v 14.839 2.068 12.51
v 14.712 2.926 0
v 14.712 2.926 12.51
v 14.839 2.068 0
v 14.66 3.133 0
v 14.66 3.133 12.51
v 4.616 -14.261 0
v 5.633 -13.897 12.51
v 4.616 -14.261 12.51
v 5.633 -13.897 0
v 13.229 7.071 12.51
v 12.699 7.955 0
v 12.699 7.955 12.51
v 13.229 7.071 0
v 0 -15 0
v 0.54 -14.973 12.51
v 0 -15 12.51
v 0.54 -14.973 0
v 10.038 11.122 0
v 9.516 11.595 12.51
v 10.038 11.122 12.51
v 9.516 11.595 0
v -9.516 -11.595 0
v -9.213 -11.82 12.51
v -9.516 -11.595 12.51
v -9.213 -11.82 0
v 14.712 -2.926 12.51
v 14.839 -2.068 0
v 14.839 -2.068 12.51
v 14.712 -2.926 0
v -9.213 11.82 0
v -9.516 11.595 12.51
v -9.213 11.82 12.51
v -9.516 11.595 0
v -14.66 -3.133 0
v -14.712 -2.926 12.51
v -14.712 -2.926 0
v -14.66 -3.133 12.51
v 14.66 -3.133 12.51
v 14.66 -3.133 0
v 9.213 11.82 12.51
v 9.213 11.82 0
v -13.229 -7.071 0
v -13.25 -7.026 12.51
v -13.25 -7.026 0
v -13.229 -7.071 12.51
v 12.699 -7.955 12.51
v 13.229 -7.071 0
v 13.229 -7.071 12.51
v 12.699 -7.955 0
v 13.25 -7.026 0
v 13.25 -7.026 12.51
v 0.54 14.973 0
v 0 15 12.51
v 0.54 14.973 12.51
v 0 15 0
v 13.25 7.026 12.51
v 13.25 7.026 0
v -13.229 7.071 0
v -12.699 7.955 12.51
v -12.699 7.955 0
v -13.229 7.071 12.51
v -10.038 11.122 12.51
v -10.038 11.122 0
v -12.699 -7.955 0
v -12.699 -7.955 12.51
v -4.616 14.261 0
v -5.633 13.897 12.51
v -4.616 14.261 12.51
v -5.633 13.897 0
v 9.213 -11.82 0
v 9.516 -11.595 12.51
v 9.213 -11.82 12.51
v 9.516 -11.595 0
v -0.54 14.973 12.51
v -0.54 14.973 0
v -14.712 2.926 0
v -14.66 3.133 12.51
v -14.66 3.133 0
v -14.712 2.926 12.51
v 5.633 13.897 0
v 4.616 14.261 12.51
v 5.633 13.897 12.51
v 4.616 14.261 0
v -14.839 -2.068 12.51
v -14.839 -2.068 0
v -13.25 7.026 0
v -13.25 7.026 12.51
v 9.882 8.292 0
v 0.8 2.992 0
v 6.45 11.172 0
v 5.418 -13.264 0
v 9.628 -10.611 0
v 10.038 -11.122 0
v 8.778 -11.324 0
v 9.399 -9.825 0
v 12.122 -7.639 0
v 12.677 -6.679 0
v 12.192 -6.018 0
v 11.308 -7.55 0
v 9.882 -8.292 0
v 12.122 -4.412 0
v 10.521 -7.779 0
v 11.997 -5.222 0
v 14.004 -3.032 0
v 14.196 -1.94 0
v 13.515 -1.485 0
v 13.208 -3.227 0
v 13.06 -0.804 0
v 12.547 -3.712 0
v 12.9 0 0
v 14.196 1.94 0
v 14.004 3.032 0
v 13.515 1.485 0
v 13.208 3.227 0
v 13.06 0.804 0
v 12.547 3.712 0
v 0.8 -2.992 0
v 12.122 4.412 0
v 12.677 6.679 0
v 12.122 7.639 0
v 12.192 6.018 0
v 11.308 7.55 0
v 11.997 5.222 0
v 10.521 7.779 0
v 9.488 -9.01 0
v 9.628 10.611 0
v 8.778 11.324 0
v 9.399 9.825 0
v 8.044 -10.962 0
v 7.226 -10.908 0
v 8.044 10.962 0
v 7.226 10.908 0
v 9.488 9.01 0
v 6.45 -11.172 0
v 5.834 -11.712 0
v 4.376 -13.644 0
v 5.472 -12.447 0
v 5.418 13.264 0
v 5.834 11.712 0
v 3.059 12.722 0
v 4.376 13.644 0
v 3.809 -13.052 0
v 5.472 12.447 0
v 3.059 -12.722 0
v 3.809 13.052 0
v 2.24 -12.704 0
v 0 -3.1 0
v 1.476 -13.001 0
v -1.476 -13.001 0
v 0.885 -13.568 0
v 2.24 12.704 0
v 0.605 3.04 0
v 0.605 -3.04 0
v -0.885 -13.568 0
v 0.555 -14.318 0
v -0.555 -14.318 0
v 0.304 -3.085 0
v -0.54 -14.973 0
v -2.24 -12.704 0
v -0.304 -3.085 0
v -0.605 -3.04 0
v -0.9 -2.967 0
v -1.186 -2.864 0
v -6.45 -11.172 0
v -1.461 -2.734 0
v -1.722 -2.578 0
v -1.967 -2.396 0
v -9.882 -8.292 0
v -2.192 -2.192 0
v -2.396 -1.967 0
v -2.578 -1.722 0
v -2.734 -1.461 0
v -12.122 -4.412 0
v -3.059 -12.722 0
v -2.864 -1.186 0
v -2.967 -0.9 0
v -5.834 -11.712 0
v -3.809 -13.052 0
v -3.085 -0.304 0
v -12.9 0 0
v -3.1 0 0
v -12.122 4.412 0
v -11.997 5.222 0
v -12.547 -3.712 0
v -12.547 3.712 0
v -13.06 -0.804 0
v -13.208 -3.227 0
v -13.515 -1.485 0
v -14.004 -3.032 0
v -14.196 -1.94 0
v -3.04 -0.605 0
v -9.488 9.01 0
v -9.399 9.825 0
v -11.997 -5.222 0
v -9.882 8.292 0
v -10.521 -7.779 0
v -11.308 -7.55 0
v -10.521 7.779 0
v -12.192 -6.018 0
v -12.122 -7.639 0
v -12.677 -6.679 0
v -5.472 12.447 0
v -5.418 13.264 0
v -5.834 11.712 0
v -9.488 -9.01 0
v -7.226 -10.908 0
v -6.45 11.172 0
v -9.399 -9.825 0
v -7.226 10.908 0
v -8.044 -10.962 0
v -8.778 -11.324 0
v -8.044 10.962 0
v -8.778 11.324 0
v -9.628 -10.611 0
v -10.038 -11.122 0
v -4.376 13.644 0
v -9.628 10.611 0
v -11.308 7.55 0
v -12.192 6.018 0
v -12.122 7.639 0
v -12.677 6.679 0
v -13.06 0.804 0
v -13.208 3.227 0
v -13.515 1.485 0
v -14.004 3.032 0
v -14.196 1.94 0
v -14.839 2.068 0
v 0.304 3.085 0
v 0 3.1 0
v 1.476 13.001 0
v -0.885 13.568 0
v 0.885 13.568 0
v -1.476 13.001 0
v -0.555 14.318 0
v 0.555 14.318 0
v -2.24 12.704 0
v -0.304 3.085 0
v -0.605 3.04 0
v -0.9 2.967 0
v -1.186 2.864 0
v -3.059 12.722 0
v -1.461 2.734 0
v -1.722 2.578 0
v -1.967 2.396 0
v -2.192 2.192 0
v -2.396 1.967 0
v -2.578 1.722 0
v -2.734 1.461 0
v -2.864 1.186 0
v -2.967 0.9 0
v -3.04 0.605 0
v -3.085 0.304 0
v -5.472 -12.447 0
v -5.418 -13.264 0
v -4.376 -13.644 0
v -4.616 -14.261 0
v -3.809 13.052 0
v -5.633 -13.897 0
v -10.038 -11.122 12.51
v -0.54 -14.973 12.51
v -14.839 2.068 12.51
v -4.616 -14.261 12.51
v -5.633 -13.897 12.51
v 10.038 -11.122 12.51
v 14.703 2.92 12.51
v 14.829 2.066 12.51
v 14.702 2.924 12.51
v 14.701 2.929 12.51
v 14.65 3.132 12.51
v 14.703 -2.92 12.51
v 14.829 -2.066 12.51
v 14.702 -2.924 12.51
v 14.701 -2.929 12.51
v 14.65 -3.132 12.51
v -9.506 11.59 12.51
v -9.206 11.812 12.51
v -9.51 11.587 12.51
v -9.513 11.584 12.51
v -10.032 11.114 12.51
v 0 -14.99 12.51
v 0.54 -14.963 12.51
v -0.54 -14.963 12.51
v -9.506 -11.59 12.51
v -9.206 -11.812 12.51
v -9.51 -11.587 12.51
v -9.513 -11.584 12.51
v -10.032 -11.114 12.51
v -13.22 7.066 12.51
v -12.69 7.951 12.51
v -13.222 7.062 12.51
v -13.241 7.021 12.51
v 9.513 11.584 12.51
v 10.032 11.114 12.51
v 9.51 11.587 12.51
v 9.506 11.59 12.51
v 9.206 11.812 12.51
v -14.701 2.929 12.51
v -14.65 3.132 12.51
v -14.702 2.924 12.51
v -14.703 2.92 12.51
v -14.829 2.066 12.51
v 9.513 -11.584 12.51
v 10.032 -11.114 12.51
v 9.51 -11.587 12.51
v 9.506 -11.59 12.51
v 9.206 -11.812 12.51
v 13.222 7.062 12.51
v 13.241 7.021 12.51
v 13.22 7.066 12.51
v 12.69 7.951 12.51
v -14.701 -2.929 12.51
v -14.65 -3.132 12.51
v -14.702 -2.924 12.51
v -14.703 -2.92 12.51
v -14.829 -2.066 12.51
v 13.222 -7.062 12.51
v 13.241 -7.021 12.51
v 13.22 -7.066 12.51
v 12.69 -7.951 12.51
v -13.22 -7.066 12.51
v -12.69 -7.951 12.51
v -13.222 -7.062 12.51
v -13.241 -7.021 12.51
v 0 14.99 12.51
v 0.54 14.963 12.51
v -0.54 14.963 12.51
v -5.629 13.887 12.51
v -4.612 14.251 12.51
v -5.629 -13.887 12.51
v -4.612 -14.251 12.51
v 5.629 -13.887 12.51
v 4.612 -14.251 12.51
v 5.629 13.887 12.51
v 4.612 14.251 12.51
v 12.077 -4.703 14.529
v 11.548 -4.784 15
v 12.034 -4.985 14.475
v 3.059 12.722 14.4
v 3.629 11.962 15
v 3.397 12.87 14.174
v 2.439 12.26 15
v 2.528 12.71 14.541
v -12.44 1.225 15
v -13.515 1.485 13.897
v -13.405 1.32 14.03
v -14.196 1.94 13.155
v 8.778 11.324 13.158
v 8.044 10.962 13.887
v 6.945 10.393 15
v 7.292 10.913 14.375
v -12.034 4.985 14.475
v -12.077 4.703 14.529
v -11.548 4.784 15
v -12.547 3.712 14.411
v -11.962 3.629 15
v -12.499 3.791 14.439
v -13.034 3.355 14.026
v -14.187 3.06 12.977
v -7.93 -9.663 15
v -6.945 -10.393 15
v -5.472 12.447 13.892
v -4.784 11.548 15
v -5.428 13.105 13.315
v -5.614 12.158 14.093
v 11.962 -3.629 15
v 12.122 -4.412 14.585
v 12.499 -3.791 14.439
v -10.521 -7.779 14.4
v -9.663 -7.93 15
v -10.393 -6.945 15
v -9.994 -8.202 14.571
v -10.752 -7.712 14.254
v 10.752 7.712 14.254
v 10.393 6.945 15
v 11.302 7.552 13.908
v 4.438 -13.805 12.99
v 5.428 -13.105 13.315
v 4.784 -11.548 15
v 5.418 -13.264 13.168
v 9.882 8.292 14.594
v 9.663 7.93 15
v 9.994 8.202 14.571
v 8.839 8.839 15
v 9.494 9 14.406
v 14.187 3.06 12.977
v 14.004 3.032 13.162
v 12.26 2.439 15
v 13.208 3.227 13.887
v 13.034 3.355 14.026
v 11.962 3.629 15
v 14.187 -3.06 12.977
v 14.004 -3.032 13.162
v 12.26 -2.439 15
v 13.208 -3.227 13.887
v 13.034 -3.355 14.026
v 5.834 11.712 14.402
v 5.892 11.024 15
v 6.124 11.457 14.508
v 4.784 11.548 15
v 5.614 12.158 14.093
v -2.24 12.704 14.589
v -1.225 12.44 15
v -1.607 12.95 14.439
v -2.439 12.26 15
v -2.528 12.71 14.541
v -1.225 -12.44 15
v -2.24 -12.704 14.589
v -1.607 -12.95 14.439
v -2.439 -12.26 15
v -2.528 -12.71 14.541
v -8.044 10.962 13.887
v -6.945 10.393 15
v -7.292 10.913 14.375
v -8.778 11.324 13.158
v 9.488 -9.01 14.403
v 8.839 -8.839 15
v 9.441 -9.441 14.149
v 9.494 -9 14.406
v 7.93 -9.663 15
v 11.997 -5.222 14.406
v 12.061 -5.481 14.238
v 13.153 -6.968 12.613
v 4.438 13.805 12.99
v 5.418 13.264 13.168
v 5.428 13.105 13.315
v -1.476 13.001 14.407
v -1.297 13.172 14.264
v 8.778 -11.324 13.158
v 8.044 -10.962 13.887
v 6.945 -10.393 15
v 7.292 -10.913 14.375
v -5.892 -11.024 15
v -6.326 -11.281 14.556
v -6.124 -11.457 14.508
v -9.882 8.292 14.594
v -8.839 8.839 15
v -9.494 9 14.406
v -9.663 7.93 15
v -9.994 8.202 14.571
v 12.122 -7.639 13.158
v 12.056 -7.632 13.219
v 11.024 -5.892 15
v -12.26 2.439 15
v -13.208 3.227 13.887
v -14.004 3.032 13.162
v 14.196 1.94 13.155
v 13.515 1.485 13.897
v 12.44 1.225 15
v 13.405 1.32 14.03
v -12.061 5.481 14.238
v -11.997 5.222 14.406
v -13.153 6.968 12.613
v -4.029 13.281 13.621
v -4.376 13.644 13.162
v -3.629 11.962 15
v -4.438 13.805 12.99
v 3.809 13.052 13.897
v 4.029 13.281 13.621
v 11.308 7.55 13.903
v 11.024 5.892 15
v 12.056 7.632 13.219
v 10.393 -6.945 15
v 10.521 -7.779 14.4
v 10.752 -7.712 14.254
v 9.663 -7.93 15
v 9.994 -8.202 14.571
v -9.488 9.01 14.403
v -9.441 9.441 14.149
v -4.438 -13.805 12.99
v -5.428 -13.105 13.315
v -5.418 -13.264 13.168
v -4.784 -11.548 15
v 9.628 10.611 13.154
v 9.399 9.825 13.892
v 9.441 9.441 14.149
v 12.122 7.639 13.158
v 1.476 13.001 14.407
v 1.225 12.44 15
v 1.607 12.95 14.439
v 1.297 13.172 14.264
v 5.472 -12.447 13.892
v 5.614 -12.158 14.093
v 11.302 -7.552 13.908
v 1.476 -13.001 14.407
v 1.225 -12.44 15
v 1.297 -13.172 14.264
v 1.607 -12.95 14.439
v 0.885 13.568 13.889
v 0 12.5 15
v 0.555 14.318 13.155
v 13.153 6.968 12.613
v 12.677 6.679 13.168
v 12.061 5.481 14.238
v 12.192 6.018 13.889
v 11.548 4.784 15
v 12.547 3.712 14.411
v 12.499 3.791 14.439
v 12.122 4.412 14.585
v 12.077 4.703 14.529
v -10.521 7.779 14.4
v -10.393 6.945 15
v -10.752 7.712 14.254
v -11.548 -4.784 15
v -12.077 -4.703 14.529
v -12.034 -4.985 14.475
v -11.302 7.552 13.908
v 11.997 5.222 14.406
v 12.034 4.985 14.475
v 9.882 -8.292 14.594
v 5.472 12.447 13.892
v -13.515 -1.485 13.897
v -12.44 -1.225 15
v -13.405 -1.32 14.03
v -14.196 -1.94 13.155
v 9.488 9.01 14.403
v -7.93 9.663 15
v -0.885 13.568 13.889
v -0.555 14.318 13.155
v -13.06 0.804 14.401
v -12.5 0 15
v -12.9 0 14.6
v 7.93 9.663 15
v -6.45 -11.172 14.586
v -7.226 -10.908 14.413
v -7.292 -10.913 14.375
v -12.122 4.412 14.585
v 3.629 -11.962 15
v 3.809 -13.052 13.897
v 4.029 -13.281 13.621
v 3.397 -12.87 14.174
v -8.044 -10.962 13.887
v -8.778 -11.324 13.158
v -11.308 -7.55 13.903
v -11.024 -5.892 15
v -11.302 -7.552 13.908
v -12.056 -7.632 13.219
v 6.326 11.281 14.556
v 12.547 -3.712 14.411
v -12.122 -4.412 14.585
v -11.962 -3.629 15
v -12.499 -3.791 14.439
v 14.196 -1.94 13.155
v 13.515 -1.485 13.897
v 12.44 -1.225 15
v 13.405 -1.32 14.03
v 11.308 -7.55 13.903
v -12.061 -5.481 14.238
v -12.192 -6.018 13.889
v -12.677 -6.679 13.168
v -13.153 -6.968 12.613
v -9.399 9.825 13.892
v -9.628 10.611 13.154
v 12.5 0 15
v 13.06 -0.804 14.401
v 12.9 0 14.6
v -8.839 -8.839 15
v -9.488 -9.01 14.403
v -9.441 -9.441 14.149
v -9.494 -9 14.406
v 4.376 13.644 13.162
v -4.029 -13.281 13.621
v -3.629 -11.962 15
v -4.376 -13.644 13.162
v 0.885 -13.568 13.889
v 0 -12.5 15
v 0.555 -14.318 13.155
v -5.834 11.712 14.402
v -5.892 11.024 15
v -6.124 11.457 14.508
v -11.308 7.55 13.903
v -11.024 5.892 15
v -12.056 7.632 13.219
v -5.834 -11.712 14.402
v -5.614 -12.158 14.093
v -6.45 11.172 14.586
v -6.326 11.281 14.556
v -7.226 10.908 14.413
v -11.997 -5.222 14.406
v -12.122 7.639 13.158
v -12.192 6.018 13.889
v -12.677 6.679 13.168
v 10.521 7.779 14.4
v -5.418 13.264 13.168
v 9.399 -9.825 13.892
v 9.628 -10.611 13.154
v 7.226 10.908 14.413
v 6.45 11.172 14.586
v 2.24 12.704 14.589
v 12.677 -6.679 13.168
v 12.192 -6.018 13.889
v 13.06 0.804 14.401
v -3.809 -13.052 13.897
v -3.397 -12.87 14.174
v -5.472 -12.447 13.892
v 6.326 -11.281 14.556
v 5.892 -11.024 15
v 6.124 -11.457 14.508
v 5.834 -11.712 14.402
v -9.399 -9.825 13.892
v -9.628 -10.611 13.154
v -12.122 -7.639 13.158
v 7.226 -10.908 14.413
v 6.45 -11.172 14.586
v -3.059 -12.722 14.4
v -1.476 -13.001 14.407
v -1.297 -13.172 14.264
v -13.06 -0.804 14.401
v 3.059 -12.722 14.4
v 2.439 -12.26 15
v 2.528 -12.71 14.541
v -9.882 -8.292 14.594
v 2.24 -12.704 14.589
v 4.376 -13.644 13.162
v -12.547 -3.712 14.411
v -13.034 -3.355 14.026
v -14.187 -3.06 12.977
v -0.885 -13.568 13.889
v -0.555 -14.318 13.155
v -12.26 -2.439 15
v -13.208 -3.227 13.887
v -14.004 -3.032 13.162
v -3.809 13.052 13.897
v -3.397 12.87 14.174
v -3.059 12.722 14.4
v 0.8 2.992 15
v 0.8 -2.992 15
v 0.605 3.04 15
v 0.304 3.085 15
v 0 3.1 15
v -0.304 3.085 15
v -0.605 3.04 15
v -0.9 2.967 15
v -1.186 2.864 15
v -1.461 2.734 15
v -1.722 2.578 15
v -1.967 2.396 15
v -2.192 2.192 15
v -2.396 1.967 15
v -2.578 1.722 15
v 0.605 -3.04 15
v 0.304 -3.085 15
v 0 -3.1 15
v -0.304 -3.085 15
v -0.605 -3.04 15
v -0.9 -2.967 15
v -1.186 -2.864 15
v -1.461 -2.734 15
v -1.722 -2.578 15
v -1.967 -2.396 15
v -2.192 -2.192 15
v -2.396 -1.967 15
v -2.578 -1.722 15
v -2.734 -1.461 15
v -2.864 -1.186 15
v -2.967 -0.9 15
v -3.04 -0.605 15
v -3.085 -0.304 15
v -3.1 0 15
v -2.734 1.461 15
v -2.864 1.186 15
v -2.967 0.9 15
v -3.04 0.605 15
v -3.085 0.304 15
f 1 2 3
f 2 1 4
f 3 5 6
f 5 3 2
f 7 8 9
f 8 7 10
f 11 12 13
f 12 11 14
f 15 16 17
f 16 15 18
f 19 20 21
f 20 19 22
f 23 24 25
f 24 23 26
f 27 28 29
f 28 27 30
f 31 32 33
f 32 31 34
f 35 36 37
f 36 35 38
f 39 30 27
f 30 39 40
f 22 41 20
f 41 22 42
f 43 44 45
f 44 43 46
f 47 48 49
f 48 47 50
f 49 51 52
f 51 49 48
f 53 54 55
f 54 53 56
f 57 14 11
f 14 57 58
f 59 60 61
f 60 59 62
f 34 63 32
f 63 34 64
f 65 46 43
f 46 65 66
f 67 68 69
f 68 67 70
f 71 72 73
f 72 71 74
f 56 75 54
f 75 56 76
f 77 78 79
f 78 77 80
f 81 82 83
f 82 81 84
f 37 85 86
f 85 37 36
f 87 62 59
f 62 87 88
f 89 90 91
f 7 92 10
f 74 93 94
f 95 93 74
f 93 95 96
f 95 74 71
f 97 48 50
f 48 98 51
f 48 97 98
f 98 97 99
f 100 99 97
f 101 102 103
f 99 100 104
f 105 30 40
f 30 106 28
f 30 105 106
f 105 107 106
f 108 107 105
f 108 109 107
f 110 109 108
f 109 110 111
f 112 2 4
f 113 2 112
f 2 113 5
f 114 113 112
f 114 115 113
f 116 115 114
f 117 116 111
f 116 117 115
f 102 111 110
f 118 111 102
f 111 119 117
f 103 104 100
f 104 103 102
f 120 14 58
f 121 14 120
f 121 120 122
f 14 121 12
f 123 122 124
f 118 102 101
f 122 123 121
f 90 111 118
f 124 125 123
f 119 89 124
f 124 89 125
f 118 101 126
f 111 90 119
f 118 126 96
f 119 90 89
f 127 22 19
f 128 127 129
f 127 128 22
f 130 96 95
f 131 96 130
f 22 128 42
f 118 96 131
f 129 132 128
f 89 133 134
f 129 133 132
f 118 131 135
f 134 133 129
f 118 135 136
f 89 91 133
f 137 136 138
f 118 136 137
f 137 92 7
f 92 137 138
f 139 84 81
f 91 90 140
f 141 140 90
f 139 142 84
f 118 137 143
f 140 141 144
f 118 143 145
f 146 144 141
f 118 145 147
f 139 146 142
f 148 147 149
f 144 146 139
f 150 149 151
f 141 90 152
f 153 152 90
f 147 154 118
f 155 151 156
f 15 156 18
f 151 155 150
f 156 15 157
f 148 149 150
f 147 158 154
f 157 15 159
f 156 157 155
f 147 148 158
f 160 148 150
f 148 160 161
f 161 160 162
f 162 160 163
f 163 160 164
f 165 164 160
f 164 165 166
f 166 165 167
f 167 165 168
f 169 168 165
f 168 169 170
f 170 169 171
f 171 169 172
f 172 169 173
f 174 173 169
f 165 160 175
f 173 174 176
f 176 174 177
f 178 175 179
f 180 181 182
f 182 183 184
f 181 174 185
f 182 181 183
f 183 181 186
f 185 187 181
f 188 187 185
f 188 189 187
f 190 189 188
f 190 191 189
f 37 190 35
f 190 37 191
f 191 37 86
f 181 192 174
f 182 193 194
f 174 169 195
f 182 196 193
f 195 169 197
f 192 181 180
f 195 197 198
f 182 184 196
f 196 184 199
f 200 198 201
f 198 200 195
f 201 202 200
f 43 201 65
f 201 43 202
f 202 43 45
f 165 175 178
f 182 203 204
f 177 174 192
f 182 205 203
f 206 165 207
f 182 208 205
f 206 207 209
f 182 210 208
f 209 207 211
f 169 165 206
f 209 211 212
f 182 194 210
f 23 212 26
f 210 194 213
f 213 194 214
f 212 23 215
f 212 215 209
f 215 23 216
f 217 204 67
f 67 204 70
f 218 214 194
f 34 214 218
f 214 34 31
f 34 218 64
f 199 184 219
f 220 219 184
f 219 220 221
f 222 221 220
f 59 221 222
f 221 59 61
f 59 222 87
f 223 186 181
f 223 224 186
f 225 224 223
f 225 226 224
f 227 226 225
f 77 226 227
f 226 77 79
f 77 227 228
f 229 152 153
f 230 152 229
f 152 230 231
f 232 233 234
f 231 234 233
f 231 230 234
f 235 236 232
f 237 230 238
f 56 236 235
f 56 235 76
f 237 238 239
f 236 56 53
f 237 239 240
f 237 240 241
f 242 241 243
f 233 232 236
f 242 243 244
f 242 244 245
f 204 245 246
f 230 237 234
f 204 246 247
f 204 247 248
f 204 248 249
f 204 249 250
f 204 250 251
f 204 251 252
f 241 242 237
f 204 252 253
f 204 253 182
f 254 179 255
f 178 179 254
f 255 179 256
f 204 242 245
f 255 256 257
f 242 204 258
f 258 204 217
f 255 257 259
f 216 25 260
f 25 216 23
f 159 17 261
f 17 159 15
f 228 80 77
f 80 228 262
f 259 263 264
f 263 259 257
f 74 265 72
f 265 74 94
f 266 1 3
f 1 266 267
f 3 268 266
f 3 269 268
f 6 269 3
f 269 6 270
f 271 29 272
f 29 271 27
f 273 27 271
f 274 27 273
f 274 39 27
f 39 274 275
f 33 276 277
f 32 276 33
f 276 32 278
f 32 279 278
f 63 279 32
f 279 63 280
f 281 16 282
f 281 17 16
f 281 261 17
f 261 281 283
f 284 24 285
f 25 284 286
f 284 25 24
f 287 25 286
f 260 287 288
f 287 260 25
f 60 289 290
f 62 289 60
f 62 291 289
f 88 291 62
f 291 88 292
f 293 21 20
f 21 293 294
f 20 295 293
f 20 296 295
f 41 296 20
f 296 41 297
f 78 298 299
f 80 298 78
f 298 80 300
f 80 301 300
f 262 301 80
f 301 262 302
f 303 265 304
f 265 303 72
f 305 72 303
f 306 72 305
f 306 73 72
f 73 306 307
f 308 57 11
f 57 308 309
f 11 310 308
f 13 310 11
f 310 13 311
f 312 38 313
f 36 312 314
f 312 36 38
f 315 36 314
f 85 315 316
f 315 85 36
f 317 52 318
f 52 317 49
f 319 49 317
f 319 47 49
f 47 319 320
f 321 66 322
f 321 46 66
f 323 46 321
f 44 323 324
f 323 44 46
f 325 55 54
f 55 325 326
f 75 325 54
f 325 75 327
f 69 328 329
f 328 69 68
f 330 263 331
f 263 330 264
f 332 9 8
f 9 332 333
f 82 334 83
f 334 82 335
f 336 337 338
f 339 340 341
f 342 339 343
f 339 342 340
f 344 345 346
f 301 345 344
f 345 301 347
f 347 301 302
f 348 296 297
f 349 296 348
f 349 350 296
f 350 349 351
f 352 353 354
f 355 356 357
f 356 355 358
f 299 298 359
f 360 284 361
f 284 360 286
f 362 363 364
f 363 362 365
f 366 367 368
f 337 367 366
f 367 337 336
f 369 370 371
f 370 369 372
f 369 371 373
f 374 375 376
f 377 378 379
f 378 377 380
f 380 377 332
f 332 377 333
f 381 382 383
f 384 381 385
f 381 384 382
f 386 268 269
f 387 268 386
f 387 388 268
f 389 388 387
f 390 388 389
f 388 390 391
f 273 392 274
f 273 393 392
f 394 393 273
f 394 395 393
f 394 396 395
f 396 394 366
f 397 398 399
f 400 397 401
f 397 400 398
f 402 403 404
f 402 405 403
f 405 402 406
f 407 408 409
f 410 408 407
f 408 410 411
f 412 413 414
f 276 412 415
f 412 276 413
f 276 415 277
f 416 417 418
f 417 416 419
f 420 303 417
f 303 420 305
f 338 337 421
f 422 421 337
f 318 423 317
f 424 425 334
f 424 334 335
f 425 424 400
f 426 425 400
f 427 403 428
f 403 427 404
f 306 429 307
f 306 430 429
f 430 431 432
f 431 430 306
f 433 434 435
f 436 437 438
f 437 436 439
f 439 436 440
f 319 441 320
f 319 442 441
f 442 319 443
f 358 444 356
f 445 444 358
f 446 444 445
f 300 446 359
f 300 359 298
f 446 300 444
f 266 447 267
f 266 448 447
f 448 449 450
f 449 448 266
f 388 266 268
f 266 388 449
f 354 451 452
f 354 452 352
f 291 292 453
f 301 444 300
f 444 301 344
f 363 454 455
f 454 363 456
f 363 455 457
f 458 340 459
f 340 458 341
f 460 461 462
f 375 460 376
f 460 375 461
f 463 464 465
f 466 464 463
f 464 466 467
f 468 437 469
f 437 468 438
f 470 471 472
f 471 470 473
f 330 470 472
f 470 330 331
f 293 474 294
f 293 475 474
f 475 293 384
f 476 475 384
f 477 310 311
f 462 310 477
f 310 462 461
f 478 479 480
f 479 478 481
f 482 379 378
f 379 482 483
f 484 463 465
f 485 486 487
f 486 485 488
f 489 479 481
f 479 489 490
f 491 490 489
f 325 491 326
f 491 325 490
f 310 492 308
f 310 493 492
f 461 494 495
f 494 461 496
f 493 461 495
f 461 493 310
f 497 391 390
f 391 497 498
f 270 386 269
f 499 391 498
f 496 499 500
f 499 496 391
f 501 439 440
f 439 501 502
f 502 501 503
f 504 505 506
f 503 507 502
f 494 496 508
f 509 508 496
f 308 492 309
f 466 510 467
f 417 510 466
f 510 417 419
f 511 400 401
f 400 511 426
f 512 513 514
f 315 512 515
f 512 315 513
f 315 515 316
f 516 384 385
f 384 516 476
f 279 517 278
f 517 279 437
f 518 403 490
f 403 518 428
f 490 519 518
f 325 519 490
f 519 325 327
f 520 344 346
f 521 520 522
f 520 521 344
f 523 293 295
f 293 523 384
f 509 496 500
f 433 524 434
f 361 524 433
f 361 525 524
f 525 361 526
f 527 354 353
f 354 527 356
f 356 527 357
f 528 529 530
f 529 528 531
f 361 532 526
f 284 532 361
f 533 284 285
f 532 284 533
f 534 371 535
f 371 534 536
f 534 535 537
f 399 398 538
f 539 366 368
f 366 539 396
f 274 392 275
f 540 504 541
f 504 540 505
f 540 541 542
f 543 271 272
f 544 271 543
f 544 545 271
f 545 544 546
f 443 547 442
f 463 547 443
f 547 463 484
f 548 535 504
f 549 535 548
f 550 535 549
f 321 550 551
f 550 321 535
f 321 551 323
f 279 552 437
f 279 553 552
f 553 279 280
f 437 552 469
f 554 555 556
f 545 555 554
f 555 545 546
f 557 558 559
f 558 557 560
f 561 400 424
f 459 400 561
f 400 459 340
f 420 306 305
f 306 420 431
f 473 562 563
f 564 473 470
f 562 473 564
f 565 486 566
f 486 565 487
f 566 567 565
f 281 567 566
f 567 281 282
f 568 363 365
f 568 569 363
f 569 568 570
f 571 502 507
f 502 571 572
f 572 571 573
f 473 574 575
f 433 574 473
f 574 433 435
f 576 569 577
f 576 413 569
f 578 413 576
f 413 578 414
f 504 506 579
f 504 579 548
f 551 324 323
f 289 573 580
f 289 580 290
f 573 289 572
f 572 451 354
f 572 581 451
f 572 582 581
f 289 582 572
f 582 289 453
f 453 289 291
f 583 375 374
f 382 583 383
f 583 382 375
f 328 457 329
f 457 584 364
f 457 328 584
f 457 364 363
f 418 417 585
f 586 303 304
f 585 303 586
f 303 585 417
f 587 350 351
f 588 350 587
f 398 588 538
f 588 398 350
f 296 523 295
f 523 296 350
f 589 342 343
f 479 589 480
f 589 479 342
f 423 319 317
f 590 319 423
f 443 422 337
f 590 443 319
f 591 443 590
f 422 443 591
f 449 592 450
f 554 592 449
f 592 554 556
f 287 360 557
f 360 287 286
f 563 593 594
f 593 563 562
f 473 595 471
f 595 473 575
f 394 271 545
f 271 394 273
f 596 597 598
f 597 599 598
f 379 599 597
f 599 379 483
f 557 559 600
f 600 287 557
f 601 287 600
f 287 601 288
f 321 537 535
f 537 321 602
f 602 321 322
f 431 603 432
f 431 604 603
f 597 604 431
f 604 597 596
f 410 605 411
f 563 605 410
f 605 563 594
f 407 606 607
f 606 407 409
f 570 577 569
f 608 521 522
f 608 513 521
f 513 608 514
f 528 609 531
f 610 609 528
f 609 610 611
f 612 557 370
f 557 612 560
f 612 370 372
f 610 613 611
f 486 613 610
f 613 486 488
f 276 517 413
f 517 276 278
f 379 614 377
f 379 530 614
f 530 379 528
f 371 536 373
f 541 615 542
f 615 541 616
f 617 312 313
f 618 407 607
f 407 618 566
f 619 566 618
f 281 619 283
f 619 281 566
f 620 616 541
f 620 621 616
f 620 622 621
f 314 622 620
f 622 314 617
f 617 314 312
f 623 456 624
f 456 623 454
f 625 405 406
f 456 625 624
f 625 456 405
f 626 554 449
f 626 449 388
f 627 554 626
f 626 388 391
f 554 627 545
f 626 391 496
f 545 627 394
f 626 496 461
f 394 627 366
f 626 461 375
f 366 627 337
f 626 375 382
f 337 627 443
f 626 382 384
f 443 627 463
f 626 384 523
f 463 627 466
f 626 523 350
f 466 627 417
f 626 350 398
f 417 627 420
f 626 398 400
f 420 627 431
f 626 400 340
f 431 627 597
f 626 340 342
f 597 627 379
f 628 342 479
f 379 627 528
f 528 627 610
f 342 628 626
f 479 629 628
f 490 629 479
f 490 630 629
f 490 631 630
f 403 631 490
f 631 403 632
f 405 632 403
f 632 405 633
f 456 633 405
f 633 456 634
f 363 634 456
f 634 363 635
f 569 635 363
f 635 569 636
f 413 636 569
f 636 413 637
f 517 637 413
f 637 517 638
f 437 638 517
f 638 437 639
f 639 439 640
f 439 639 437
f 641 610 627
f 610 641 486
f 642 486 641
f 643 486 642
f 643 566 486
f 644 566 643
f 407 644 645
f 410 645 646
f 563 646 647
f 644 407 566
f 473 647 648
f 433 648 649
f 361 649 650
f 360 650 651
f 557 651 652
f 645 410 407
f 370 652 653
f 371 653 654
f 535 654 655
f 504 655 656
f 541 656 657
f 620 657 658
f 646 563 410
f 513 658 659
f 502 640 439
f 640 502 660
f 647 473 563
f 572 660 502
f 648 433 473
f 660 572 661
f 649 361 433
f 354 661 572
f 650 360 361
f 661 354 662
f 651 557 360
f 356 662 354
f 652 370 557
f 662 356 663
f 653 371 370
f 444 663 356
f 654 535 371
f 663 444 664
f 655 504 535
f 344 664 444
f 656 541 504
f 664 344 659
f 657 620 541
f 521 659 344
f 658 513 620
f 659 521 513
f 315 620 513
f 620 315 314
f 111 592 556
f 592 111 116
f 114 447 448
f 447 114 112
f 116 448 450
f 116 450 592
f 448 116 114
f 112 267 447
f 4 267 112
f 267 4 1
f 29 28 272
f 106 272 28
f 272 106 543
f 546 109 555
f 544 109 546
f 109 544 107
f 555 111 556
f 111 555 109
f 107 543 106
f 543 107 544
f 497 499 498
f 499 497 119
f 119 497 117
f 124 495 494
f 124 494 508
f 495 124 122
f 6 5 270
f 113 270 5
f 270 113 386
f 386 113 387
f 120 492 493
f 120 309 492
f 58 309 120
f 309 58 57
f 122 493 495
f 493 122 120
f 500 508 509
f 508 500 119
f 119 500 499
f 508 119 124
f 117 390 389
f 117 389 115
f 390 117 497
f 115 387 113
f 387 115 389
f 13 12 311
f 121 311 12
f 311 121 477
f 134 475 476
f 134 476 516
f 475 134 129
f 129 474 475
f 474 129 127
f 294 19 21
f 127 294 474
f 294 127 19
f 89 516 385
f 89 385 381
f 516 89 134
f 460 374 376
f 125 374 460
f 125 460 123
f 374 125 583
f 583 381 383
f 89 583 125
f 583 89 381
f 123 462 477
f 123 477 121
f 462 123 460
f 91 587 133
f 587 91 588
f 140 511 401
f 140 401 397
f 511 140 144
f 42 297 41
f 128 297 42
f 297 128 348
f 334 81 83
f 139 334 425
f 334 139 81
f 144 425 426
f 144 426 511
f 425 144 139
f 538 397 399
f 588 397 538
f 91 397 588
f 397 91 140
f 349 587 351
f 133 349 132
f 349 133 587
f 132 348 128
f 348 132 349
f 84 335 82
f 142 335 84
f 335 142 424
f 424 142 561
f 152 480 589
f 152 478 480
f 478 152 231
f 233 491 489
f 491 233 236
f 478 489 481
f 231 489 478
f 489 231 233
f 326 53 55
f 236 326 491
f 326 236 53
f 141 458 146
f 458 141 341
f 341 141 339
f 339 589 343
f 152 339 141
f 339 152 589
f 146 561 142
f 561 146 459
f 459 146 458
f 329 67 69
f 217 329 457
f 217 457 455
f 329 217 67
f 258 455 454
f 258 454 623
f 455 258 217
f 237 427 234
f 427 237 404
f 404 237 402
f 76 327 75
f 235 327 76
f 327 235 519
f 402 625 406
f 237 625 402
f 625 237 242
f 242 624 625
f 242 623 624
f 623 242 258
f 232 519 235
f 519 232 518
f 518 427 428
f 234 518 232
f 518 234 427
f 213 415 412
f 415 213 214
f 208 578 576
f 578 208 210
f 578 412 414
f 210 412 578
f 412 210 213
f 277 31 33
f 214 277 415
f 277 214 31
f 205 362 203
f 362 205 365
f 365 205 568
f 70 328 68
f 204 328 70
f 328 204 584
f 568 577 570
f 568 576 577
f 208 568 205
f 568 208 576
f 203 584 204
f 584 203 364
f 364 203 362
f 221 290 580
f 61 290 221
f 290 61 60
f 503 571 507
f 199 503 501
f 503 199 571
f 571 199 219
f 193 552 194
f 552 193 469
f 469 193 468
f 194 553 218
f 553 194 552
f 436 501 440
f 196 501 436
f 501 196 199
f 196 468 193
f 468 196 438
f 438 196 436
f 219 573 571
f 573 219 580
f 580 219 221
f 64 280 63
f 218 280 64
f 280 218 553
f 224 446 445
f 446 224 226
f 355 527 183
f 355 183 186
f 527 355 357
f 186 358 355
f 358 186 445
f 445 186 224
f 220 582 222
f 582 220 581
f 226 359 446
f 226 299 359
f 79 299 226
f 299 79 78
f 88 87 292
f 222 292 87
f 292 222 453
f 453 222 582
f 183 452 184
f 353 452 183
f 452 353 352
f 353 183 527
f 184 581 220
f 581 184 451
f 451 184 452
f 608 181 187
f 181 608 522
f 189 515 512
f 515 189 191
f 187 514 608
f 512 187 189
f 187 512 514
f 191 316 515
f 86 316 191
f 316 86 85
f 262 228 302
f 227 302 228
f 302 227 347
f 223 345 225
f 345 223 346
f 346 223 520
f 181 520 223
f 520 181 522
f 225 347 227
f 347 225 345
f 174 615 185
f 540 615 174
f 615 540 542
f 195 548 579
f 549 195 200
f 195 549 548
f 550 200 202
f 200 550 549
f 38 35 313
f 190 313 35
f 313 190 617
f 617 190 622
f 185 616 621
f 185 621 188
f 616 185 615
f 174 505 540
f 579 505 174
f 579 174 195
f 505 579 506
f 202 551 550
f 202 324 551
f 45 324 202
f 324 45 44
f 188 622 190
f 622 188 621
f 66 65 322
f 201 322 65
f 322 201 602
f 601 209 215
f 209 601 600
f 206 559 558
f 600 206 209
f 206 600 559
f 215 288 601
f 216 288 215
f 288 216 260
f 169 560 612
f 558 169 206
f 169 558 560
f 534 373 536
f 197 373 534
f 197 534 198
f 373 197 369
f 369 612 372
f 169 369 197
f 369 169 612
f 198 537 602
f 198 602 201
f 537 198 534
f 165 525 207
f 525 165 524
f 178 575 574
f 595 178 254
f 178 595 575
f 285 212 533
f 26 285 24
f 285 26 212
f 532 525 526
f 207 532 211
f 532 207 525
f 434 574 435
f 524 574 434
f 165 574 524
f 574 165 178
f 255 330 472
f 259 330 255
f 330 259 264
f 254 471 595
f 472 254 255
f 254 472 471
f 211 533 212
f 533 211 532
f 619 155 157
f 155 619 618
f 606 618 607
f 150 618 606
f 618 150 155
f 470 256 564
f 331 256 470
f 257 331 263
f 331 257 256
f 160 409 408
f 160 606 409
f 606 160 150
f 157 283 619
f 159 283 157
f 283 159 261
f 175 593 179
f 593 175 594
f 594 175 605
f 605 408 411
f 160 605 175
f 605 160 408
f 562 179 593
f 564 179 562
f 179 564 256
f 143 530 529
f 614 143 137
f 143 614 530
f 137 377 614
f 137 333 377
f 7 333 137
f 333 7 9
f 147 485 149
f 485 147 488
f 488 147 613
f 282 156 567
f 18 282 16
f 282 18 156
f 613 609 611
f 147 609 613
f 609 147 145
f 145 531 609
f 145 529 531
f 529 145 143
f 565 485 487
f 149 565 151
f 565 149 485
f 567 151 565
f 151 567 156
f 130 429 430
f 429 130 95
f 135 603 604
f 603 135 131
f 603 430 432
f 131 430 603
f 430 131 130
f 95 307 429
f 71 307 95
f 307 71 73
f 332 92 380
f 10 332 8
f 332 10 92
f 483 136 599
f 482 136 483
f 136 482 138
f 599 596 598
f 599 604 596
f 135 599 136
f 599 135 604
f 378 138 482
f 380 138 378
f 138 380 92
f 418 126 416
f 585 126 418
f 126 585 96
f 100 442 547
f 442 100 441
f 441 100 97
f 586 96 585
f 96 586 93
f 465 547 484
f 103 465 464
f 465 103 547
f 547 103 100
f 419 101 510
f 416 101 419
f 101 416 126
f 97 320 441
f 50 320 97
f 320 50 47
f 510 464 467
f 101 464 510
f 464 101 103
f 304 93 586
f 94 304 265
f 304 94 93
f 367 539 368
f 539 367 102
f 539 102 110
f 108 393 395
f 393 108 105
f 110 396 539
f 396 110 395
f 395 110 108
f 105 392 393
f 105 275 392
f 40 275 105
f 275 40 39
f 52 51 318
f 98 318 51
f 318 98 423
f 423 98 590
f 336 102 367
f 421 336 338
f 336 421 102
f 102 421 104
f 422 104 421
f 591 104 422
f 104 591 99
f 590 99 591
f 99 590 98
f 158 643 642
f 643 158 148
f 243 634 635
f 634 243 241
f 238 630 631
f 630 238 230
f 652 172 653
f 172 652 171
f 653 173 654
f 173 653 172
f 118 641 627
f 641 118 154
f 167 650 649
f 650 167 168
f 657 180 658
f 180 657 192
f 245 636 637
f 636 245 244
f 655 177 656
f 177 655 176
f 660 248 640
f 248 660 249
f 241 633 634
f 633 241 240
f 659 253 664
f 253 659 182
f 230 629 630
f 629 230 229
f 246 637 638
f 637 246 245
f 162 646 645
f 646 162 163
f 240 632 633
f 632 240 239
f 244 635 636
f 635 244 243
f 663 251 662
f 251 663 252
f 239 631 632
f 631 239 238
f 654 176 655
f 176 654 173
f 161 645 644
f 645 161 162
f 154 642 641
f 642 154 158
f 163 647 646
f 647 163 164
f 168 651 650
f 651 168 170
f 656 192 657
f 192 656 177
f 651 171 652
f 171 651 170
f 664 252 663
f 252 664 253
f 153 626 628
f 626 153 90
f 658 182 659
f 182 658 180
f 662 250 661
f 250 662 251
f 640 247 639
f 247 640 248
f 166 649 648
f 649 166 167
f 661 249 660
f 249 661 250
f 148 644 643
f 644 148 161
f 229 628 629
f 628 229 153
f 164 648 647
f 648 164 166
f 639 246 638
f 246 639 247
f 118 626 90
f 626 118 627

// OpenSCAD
// Knurled control knob - a cylindrical knob with a ring of grip flutes, a chamfered top edge, and a
// shaft bore with an optional flat (D-bore). Teaches a coarse surface texture, an edge chamfer, and
// a D-bore via intersection(). NOVEL general part.
//
// @desc fluted (knurled) knob with a chamfered top and a D-bore
// @prompt Design a control knob in OpenSCAD: {d} mm across and {h} mm tall with {flutes} grip flutes around the rim, a chamfered top edge, and a {bore} mm shaft bore with a flat {flat} mm deep. Reply with a single complete OpenSCAD file.
// @param d      knob diameter, mm      [18:50]
// @param h      knob height, mm        [12:30]
// @param flutes number of flutes       [8:18:1]
// @param bore   shaft bore, mm         [4:10]
// @param flat   shaft flat depth, mm   [0:3]

d      = 30;
h      = 15;
flutes = 18;
bore   = 6.2;
flat   = 3;

$fn = 64;

chamf = min(2.5, h / 4);
fd    = d * 0.14;                 // flute-cutter diameter
fl    = min(flat, bore / 2 - 0.8); // keep the D-flat shallower than the bore radius

difference() {
    union() {
        cylinder(h = h - chamf + 0.01, d = d);                                          // body
        translate([0, 0, h - chamf]) cylinder(h = chamf, d1 = d, d2 = d - 2 * chamf);   // chamfered top
    }
    for (i = [0 : flutes - 1])                                                           // grip flutes
        rotate([0, 0, i * 360 / flutes])
            translate([d / 2, 0, -1]) cylinder(h = h + 2, d = fd, $fn = 16);
    translate([0, 0, -1]) intersection() {                                              // shaft bore, D-flat on +x
        cylinder(h = h + 2, d = bore);
        translate([-d, -d, 0]) cube([d + bore / 2 - fl, 2 * d, h + 2]);
    }
}
